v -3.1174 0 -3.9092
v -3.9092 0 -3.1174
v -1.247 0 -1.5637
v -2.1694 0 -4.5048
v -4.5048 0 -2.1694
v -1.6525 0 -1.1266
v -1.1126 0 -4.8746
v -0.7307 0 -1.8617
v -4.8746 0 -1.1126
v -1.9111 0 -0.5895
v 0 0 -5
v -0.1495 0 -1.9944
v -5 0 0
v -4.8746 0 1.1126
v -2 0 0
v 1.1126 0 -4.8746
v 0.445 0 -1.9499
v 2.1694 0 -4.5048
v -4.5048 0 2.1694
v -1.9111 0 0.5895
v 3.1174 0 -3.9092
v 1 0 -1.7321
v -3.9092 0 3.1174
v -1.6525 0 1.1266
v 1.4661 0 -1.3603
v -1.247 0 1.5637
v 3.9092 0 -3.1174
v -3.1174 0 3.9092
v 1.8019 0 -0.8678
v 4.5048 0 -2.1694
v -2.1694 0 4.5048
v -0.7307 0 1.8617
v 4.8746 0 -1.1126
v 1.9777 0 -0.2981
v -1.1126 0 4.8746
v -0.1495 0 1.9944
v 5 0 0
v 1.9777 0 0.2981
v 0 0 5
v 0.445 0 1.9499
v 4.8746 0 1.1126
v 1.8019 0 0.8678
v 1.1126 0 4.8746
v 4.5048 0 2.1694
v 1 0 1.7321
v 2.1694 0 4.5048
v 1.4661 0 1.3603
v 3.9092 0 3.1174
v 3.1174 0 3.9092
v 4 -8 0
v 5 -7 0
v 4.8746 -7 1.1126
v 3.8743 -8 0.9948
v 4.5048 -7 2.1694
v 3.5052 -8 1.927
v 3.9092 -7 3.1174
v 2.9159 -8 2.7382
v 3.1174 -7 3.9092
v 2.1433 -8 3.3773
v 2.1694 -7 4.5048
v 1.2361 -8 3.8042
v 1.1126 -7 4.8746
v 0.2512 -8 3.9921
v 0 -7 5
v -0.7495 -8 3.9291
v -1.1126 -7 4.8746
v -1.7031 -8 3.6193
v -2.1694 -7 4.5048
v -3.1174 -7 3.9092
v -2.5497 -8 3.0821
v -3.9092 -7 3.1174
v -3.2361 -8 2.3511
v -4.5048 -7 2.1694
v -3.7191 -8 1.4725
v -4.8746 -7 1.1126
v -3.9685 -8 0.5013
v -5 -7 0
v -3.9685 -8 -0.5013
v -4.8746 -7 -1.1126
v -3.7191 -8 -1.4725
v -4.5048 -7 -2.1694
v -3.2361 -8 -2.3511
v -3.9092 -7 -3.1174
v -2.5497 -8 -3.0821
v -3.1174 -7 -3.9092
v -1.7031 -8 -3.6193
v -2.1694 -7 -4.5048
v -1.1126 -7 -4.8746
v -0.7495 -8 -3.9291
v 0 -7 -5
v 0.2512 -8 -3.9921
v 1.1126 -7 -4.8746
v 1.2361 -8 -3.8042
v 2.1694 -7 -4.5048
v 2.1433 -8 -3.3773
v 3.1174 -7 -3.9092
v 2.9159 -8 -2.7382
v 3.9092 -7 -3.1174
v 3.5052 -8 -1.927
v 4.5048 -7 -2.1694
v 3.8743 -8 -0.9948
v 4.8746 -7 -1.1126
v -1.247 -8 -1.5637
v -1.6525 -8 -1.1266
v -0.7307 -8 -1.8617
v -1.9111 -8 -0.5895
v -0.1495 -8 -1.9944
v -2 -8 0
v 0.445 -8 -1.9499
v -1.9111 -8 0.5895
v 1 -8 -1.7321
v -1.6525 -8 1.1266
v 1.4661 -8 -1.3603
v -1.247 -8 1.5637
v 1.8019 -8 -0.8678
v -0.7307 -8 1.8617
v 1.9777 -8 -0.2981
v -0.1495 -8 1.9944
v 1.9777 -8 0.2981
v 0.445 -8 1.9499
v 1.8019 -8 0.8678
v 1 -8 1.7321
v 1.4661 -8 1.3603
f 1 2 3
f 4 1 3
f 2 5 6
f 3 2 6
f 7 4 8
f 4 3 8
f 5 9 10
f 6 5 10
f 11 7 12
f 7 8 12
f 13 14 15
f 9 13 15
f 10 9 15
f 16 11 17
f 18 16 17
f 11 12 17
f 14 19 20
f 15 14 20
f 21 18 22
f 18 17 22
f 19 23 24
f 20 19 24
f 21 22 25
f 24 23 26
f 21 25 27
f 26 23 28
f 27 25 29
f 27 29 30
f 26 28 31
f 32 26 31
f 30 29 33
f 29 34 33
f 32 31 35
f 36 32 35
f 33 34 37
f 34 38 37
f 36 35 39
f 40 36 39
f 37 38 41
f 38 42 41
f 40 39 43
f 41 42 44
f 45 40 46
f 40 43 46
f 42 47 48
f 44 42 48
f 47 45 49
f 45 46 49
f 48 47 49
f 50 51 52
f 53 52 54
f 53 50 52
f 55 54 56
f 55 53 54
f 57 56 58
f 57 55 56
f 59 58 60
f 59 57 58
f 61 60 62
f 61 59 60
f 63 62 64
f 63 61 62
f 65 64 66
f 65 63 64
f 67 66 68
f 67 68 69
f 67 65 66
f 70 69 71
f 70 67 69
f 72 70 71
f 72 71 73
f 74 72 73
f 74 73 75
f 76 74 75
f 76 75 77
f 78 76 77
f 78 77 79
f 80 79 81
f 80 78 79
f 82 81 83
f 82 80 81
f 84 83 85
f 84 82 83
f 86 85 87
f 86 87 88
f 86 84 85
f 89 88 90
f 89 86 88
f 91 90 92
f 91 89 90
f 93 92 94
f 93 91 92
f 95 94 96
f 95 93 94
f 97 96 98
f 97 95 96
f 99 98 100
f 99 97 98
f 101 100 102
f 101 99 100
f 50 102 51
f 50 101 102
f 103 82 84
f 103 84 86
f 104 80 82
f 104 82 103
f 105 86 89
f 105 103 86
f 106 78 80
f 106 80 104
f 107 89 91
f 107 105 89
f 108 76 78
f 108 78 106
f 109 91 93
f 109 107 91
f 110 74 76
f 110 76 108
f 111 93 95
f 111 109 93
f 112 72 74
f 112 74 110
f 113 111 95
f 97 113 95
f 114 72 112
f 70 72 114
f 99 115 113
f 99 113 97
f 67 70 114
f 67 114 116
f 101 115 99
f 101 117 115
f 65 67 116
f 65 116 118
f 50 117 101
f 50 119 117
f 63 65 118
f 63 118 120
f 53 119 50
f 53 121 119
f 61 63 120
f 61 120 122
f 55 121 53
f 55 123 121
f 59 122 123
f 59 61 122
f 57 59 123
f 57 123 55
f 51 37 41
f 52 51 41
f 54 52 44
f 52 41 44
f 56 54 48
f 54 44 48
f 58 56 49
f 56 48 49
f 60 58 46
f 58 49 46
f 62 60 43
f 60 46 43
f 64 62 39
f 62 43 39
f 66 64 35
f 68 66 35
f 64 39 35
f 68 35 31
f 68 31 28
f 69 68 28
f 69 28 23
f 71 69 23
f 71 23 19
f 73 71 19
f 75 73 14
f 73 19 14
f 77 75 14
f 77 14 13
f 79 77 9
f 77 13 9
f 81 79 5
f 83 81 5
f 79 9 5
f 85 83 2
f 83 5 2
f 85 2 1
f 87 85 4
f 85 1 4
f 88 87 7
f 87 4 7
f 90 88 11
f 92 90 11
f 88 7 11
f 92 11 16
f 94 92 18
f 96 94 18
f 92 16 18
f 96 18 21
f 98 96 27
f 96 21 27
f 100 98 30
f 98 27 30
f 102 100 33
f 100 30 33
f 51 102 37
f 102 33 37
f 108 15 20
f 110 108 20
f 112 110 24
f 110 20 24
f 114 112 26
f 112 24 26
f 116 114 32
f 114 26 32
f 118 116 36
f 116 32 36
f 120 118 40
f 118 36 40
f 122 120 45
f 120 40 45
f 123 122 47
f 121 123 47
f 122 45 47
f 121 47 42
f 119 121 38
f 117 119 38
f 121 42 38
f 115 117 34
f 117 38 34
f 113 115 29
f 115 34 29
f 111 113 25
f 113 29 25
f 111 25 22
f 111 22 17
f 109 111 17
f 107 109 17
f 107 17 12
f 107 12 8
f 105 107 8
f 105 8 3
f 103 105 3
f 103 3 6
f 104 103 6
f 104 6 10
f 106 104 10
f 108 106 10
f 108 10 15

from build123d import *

# Parameters (mm, degrees)
F0_R     = 5
F1_DEPTH = 8
F3_D     = 4
F4_SIZE  = 1


with BuildPart() as f1:
    # F0 (on Front) → F1 (new body)
    with BuildSketch(Plane.XZ):
        Circle(F0_R)
    extrude(amount=F1_DEPTH)

    # F3 (through all)
    with Locations(Plane.XZ.offset(8)):
        with Locations((0, 0)):
            Hole(F3_D / 2)

    # F4
    f4_edges = [f1.edges().sort_by_distance(p)[0] for p in [
        (-5, -8, 0),
    ]]
    chamfer(f4_edges, length=F4_SIZE)


solid = f1.part
